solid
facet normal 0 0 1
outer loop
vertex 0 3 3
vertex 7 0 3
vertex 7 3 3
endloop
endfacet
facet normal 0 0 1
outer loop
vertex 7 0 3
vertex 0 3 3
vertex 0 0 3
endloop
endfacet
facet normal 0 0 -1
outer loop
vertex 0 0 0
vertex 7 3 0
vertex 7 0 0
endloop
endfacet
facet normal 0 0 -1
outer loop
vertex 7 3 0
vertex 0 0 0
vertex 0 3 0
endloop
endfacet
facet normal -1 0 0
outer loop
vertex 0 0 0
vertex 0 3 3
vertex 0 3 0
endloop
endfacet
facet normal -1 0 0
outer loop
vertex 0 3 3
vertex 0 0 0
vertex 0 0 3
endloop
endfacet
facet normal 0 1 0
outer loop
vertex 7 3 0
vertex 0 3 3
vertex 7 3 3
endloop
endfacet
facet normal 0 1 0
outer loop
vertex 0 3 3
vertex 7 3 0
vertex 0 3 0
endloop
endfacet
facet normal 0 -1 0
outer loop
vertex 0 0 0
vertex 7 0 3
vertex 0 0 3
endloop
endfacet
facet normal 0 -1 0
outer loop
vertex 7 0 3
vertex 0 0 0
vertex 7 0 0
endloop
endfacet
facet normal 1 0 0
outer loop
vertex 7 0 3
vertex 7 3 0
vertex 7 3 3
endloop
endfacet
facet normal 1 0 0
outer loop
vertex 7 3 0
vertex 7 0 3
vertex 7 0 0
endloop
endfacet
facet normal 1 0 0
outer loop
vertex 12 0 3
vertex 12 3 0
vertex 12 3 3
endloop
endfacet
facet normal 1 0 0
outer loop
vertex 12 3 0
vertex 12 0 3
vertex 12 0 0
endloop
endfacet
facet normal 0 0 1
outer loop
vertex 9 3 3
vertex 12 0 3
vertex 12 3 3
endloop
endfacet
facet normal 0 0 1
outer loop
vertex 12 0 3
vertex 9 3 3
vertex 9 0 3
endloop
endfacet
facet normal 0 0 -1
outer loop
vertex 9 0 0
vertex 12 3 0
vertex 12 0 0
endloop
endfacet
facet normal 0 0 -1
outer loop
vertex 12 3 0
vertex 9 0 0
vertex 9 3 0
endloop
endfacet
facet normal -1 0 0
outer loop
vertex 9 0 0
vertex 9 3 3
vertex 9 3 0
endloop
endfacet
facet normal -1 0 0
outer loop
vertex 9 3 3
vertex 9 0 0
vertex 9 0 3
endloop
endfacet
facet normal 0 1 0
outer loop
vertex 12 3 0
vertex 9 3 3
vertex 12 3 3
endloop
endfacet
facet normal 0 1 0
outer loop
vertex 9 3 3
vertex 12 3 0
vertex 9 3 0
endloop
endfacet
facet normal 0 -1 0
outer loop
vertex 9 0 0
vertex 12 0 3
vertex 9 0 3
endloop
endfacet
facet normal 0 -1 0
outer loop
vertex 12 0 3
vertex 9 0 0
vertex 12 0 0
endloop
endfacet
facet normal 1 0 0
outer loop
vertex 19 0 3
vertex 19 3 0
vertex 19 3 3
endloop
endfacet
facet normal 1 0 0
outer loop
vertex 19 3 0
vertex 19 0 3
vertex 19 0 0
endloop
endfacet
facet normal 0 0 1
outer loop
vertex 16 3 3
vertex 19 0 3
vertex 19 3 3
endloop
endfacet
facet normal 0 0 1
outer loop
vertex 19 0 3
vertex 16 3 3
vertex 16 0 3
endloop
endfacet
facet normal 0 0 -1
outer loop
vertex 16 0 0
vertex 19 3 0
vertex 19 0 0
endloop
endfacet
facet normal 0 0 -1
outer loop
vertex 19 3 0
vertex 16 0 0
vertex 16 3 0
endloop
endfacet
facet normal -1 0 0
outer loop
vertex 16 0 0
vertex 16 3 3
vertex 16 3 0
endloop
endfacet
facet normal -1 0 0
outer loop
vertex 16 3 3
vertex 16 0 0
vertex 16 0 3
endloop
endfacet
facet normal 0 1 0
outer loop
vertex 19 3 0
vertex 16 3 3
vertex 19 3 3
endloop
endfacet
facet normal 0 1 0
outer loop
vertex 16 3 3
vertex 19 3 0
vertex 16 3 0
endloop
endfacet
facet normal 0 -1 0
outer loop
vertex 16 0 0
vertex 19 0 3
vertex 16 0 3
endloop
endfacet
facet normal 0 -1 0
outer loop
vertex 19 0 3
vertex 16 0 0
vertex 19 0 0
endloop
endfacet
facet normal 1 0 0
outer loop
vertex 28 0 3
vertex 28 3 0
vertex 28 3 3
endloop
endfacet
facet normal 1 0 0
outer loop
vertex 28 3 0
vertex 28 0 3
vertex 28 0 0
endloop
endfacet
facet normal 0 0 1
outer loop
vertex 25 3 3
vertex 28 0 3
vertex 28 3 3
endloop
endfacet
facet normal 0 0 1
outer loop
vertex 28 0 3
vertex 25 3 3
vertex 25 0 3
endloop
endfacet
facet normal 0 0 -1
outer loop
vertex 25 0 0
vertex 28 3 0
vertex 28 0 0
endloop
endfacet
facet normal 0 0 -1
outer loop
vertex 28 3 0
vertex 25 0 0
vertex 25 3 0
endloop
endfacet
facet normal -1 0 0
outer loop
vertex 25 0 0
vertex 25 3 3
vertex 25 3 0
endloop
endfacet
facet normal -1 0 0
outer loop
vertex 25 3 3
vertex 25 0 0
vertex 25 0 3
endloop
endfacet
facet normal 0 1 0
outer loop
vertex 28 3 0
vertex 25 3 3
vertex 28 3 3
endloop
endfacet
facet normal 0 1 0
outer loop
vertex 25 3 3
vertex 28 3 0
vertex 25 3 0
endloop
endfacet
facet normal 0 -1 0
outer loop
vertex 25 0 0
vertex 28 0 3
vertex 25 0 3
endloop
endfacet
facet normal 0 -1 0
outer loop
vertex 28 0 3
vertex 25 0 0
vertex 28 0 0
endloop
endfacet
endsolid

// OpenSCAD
// Construct: list comprehension generating translate offsets.
offsets = [for (i = [0 : 5]) i * i];
for (o = offsets) {
    translate([o, 0, 0]) cube(3);
}
